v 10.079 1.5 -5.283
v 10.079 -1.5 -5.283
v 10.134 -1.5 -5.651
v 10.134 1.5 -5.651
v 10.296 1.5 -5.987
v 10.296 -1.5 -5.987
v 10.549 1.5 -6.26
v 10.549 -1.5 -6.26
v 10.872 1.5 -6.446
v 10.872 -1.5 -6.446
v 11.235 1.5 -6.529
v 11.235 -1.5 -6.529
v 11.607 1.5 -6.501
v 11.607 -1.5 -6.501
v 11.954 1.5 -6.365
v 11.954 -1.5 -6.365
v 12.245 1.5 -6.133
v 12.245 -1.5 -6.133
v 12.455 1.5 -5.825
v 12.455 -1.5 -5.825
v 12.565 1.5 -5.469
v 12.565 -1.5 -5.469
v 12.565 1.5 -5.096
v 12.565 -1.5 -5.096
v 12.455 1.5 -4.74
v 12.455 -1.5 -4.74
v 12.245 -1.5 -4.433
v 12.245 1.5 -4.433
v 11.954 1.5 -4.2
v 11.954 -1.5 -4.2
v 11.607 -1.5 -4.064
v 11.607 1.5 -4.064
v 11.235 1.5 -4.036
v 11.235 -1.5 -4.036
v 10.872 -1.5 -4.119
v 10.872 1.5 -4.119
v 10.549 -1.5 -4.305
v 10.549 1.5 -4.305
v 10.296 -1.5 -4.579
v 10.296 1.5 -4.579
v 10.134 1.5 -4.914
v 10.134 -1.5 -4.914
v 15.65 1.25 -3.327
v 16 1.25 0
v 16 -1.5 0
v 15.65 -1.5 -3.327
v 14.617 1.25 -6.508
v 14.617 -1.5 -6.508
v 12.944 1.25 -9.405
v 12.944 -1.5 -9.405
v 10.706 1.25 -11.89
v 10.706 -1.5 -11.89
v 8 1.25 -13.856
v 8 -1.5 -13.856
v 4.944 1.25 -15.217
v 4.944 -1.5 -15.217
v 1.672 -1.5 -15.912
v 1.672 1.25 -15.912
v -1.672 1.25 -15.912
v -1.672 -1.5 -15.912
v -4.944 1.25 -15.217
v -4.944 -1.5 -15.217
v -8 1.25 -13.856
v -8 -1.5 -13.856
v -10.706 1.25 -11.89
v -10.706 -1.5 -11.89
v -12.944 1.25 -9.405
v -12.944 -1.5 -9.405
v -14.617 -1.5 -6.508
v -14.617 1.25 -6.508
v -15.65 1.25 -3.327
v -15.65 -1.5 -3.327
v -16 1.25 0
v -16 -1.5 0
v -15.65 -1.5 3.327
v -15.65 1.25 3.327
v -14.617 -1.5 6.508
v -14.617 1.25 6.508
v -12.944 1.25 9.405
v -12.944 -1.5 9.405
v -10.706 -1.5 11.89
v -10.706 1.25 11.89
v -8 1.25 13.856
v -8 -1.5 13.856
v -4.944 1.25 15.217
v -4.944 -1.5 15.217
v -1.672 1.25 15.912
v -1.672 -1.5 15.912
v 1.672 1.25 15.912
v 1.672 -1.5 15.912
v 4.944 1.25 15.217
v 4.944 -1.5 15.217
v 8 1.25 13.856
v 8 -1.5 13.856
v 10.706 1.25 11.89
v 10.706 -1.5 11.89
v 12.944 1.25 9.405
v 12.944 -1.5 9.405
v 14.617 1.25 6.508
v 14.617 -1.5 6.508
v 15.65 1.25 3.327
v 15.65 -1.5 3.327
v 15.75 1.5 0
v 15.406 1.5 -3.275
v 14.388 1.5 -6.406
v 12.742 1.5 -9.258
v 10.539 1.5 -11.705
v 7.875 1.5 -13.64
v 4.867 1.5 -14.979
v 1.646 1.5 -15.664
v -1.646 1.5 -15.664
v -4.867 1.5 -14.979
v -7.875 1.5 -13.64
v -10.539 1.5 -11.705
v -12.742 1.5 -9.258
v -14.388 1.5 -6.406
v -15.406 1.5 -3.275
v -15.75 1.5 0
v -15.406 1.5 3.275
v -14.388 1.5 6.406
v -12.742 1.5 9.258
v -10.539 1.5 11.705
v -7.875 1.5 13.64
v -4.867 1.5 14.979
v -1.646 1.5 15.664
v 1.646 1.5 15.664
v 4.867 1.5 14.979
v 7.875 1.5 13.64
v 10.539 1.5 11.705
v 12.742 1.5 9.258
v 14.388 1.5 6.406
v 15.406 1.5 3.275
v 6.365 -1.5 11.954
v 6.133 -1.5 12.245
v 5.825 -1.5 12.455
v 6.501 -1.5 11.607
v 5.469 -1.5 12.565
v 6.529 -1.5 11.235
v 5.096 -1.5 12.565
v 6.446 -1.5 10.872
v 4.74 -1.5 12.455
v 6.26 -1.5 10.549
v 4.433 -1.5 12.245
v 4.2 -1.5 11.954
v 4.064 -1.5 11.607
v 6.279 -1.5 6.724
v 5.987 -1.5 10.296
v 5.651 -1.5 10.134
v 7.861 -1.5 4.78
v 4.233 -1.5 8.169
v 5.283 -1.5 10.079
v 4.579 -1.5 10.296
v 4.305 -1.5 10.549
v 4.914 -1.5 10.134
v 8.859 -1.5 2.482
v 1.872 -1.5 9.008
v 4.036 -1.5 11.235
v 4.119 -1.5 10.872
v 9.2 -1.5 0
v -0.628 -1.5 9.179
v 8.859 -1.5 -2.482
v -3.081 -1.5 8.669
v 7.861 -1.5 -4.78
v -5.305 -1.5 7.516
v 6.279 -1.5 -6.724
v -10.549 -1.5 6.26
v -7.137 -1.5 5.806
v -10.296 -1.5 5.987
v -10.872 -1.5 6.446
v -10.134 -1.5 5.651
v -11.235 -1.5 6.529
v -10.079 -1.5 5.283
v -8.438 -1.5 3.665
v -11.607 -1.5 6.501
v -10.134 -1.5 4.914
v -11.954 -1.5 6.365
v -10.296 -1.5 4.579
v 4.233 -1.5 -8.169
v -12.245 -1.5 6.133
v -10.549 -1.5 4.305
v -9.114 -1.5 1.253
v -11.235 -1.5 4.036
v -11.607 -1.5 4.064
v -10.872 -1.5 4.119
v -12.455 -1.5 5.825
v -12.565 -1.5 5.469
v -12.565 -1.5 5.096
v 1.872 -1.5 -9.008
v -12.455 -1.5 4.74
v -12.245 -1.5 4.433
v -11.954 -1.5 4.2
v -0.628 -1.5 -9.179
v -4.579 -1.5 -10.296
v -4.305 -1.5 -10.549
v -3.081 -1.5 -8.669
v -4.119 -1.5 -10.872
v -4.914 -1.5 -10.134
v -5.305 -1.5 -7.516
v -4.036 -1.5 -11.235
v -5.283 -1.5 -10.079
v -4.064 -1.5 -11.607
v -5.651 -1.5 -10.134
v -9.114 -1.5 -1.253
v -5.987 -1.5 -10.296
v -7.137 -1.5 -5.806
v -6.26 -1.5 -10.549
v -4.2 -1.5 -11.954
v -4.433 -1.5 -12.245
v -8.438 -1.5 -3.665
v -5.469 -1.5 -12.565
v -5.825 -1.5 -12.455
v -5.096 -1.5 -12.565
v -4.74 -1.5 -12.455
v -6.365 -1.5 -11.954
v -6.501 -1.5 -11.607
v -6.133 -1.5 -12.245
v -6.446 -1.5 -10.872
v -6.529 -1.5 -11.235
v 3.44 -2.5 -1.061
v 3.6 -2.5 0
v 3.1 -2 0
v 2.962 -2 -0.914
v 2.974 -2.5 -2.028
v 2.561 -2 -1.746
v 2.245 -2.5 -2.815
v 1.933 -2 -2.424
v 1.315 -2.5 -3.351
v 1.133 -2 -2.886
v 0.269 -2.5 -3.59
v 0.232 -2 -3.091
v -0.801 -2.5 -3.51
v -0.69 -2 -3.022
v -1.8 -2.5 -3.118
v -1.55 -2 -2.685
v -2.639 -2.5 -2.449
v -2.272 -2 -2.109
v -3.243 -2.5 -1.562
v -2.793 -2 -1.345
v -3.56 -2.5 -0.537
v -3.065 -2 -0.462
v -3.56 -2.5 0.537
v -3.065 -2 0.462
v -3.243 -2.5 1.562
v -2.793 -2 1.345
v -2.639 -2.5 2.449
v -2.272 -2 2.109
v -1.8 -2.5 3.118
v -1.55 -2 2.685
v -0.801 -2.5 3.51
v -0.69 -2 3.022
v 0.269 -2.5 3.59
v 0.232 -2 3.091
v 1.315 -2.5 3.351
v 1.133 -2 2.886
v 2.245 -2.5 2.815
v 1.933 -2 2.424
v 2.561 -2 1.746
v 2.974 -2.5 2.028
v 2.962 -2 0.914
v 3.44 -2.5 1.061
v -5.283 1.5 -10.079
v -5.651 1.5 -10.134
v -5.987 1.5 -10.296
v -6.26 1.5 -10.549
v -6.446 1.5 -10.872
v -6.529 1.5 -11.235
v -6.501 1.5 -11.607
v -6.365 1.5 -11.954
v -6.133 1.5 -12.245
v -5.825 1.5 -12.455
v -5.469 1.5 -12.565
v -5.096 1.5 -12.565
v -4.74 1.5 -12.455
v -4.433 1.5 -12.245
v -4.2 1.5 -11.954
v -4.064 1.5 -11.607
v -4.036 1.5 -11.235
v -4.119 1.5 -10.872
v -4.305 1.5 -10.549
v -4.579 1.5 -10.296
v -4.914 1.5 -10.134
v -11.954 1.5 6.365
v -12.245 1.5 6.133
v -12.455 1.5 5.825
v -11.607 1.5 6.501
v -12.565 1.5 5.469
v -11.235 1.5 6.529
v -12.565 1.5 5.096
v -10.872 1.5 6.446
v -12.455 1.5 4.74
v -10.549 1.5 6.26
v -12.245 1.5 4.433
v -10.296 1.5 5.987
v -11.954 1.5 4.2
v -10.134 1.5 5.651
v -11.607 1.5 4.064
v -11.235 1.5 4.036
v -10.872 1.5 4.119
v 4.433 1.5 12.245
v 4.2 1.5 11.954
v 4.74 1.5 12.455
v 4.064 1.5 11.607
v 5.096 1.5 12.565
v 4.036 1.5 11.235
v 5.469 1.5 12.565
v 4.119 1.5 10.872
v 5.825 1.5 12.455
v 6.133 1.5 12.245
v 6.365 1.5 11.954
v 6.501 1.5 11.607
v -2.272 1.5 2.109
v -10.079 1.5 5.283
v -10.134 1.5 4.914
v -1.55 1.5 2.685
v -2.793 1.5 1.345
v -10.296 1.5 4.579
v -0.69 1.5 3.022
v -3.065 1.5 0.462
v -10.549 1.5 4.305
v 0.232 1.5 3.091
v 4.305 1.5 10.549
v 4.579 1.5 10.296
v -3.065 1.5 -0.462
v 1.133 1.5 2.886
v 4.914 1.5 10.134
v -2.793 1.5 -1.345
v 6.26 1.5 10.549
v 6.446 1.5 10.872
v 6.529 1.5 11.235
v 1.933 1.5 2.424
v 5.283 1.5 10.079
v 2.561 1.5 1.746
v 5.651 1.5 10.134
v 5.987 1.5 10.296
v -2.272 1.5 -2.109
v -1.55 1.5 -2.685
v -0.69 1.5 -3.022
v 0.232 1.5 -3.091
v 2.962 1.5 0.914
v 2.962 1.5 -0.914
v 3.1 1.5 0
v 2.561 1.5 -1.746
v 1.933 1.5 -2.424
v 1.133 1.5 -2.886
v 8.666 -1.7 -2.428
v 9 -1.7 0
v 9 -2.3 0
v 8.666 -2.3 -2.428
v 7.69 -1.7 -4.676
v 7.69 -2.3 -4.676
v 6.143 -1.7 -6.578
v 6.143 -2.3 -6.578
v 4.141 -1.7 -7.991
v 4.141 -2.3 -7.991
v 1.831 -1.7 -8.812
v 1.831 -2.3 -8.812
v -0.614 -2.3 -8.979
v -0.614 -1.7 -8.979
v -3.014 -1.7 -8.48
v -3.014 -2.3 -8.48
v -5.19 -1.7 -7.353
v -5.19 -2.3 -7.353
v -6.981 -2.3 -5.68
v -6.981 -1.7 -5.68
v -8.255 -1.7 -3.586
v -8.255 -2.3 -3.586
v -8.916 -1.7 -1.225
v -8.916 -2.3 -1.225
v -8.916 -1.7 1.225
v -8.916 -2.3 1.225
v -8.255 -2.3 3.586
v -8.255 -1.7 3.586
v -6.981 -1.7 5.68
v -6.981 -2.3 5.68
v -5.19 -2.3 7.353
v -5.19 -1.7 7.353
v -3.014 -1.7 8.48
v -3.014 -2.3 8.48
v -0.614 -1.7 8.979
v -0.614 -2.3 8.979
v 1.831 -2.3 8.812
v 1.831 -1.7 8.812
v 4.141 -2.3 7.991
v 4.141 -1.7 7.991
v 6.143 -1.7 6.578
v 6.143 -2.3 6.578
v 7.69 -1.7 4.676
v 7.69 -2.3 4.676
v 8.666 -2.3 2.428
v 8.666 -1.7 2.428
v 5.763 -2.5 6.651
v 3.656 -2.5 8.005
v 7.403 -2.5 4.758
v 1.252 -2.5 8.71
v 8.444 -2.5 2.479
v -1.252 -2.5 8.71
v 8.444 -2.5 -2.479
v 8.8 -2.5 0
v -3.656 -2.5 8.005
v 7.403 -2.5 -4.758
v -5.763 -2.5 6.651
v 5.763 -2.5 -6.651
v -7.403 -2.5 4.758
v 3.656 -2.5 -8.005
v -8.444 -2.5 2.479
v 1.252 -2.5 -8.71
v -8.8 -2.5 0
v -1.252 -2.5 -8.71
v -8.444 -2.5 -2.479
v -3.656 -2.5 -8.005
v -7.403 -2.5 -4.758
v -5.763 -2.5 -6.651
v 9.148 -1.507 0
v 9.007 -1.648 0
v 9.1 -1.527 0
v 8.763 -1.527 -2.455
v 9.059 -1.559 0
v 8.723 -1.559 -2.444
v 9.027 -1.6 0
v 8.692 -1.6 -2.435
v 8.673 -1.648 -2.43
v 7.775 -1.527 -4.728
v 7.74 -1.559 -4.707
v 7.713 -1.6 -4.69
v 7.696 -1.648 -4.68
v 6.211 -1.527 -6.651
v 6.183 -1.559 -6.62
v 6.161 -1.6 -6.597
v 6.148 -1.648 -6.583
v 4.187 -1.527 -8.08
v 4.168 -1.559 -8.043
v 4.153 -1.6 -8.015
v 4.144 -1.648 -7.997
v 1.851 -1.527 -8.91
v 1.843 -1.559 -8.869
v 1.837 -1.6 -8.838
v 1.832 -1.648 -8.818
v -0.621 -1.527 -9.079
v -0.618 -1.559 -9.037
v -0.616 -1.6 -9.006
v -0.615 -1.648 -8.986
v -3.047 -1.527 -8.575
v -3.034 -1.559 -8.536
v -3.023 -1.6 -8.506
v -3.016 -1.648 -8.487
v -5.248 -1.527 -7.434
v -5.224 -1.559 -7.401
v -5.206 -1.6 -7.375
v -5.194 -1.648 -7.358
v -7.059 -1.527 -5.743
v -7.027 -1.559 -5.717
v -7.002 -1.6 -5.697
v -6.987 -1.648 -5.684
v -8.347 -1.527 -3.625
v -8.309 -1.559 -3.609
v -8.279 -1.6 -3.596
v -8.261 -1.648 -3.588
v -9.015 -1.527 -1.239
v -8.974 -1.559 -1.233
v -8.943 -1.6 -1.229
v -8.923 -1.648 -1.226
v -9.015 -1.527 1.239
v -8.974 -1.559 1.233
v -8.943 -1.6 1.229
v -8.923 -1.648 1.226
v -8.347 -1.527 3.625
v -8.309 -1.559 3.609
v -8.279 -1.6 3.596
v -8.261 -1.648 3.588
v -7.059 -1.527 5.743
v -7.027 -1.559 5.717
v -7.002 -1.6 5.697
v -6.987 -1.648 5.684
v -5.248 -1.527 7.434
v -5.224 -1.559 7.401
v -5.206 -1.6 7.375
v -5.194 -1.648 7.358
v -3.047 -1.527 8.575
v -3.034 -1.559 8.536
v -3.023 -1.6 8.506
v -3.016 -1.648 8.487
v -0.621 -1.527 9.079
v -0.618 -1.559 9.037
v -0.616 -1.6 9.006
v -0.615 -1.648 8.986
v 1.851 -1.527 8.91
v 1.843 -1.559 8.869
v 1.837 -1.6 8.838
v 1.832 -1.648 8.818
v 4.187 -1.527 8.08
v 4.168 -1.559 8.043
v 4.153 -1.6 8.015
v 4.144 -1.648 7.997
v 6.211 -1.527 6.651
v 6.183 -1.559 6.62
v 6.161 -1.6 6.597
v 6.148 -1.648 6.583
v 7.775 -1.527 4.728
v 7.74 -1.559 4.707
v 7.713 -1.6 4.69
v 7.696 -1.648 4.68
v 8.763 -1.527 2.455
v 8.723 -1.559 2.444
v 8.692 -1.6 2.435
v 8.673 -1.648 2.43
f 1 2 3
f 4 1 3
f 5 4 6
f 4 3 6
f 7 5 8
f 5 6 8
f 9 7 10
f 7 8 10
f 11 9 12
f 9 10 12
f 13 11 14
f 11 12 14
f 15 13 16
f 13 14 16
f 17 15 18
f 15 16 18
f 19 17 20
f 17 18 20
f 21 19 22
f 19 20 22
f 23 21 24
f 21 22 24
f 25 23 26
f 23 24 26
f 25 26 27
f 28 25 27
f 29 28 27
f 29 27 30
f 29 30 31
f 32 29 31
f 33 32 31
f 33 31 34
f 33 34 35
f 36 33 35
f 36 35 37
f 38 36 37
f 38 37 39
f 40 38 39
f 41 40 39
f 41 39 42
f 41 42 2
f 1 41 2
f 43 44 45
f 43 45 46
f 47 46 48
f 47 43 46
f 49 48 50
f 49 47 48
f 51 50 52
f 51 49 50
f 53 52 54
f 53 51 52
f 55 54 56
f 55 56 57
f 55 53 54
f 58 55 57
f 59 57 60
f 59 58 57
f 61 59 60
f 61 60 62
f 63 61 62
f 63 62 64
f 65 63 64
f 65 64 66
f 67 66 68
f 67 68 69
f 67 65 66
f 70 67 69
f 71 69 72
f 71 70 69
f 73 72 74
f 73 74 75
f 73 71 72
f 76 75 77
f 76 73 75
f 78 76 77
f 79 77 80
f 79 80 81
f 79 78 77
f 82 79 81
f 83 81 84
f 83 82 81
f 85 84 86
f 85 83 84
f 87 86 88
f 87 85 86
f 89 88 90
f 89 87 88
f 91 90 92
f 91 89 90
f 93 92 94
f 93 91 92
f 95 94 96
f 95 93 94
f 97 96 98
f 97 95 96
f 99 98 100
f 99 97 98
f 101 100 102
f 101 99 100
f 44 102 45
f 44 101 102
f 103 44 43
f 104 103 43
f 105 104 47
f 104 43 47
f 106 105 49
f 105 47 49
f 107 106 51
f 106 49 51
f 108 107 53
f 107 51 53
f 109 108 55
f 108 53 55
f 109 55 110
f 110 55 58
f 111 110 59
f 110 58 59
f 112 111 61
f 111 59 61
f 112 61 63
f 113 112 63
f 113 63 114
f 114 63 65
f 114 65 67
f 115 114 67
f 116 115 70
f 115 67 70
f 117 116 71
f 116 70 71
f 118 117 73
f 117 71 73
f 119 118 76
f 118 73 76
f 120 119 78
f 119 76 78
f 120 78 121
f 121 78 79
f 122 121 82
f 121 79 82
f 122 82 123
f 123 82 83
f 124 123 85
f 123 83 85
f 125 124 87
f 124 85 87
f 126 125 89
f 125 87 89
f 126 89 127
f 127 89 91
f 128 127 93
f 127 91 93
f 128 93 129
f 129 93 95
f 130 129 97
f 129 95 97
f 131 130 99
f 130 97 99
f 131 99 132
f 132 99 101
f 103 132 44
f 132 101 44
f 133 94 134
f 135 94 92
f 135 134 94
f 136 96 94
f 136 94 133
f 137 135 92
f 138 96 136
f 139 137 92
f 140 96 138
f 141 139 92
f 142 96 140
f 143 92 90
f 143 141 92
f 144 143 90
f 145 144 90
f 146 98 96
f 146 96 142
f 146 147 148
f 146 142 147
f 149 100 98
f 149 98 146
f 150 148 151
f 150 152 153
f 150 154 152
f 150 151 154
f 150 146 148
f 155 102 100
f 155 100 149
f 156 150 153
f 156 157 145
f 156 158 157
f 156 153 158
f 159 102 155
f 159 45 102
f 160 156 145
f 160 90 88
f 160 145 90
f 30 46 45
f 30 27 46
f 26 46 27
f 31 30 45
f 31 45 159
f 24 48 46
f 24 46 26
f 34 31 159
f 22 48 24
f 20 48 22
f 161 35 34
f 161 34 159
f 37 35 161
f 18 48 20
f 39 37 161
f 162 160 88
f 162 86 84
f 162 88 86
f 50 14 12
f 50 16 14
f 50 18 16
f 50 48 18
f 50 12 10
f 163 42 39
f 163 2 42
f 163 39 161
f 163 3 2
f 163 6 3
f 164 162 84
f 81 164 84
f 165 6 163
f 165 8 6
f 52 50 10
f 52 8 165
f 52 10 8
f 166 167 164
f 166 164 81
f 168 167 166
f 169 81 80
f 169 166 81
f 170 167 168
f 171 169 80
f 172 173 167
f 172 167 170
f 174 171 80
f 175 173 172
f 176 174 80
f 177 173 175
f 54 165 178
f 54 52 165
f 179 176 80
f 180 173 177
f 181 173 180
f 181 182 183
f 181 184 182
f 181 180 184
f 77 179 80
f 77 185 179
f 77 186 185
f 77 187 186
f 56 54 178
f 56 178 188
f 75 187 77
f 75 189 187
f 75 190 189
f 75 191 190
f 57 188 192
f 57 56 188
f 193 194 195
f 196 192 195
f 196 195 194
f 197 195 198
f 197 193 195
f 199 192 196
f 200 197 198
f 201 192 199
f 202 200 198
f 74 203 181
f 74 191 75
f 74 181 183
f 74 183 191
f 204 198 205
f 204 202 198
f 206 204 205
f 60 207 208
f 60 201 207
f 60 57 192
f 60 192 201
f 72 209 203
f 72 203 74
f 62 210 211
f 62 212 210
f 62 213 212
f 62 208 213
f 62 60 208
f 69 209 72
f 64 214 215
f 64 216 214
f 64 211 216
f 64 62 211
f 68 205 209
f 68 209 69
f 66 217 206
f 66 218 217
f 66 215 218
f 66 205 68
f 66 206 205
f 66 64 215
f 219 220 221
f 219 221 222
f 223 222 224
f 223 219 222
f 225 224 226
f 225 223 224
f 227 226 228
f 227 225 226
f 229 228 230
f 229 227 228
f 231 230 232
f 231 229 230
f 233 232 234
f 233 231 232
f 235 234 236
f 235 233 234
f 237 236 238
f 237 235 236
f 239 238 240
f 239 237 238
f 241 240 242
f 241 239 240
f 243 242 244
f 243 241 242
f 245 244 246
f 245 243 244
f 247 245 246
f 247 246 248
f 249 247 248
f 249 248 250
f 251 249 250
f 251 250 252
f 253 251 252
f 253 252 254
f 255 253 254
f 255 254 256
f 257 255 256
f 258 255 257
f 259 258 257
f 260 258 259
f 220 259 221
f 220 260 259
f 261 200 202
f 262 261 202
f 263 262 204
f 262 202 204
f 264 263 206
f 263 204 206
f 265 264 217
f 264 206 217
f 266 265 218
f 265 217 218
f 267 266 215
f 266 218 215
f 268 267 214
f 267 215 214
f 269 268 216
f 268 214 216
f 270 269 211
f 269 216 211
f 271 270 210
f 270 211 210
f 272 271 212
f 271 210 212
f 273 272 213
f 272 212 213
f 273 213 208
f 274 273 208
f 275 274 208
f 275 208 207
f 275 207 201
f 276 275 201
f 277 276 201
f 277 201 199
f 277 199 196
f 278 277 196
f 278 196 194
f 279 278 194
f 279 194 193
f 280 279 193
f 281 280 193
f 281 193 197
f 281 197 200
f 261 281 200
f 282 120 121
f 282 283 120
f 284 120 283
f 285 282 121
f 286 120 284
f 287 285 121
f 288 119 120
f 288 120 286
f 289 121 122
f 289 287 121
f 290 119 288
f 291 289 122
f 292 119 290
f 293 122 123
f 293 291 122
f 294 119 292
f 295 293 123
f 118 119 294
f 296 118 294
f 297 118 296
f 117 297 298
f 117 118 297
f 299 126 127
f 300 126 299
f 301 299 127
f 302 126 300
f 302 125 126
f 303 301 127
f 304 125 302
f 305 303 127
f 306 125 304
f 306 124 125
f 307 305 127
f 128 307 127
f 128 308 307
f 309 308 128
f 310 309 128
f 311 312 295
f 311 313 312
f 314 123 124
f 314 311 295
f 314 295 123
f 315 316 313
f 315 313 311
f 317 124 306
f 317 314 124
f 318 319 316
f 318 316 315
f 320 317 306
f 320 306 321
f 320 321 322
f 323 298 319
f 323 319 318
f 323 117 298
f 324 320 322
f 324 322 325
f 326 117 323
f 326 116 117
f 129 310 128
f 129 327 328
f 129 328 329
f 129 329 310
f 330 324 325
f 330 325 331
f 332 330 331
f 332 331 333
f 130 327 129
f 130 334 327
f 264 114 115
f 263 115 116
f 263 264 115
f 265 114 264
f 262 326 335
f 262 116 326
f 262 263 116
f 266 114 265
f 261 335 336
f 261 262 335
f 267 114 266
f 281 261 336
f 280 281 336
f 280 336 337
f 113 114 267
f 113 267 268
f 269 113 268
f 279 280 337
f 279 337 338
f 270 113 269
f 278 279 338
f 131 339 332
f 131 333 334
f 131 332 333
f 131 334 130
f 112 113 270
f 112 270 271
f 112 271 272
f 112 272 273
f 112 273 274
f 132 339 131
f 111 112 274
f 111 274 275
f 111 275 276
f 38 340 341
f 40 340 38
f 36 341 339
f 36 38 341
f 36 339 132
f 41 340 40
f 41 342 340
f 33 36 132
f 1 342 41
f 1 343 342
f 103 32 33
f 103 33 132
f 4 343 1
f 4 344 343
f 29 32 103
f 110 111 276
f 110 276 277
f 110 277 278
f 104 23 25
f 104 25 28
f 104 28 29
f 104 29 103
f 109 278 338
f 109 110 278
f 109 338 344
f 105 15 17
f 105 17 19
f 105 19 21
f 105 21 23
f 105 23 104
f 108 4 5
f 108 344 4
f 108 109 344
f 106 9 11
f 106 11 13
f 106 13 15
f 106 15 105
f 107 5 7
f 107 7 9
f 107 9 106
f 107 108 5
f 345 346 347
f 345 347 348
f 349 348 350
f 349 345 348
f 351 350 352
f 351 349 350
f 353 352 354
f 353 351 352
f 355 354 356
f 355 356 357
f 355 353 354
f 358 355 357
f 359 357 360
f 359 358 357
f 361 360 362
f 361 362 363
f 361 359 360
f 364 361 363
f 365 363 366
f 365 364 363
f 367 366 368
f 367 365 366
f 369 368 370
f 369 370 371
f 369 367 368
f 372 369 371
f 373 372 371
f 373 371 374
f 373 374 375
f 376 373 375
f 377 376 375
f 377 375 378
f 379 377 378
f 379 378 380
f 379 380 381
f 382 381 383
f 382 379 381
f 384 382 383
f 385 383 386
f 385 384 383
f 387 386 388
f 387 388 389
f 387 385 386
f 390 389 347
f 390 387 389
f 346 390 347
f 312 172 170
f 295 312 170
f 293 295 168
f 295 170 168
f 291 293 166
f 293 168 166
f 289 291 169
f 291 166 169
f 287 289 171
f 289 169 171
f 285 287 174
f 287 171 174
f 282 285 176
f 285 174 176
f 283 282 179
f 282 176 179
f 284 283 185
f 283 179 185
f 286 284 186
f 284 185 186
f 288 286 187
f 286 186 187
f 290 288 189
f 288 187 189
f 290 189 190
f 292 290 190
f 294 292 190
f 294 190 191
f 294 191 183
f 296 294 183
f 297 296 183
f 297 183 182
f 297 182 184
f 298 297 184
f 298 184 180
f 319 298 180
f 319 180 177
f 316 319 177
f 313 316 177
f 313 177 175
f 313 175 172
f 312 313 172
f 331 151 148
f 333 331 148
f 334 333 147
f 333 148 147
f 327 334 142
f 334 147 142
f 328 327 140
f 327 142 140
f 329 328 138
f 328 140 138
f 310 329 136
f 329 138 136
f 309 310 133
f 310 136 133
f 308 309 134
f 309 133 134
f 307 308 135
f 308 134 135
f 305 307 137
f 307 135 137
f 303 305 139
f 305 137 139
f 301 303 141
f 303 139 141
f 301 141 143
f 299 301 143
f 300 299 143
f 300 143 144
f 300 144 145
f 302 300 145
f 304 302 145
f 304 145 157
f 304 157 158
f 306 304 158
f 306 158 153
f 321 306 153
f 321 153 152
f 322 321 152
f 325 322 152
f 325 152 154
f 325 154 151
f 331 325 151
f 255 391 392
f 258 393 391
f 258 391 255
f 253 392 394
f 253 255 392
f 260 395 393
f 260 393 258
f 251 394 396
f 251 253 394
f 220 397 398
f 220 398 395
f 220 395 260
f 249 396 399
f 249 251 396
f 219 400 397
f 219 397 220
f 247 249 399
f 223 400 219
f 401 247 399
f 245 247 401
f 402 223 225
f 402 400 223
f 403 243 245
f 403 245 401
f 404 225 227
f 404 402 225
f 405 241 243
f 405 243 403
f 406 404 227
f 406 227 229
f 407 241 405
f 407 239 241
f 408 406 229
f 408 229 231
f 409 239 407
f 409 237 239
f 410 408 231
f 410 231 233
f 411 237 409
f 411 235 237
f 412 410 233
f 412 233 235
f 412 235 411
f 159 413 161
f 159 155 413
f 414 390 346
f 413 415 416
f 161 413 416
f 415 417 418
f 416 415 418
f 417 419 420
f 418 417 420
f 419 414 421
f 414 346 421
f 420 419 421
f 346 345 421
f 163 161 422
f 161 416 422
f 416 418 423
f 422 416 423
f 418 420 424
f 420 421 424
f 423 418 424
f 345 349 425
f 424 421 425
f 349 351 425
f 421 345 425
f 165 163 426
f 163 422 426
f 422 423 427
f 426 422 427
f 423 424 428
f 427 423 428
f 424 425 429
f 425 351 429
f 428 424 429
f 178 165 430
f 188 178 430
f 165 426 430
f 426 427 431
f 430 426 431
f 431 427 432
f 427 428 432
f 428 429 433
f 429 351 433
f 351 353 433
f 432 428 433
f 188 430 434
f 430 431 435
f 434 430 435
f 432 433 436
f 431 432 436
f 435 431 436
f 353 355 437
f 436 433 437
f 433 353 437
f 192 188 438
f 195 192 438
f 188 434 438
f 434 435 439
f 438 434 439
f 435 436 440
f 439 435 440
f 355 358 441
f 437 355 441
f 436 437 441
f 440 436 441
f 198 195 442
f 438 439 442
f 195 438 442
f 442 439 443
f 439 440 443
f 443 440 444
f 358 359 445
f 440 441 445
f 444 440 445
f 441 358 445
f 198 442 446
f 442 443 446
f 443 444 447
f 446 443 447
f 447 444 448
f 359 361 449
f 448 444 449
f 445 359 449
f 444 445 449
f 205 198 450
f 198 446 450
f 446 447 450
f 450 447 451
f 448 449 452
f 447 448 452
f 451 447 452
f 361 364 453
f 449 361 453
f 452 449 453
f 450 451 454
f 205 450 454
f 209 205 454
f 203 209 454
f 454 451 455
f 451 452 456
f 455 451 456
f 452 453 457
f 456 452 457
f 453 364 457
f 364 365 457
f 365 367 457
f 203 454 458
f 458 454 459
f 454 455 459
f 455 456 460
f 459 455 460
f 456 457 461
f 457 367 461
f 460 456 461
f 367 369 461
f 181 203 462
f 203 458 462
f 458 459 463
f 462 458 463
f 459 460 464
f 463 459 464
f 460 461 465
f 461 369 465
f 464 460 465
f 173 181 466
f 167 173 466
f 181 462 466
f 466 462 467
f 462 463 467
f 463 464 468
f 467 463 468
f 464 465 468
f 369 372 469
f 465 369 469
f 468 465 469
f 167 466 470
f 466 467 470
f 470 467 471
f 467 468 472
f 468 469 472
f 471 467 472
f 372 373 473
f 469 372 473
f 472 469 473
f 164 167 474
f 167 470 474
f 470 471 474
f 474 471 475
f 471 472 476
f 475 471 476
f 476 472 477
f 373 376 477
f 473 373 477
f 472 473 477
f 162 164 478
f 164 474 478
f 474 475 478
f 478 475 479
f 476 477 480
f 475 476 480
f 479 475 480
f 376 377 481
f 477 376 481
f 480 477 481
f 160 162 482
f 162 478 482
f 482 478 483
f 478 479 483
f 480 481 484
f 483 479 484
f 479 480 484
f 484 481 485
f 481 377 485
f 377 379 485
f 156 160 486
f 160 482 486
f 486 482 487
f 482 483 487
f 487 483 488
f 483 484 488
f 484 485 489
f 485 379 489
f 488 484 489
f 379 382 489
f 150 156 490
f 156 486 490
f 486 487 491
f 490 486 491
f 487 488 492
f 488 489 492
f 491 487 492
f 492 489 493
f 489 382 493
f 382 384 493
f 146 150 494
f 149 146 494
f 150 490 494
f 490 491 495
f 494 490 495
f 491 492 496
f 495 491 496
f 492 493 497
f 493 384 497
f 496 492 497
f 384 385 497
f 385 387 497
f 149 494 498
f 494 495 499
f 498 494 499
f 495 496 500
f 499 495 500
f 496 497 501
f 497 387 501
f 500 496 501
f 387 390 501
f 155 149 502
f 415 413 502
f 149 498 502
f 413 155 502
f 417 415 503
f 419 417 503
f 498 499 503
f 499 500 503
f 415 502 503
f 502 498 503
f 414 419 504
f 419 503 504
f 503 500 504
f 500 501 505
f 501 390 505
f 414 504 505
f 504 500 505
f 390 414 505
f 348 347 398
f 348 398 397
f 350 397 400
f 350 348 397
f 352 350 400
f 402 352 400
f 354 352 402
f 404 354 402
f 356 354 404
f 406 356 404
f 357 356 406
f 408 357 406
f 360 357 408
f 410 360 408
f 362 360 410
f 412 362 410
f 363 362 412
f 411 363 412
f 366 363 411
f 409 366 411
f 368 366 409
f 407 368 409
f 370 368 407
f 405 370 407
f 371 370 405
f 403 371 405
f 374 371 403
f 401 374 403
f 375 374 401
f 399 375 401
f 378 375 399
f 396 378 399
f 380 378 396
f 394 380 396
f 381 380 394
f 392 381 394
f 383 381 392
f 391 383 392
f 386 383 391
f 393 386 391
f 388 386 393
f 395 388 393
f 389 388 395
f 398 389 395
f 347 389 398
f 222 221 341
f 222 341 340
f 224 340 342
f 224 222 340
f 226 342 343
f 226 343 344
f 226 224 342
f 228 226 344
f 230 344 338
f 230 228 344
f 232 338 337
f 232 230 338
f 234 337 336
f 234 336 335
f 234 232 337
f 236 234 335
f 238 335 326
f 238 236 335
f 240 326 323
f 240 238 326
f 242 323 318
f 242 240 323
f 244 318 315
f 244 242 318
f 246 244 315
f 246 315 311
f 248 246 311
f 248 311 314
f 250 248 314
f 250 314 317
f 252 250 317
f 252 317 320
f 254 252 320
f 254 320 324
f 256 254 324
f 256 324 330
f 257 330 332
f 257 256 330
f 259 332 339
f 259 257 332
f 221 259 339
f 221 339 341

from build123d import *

# Parameters (mm, degrees)
CHANFRO1_SIZE                 = 0.5
FURO_ROSCADO_DE_M3X0_52_D     = 2.5
FURO_ROSCADO_DE_M3X0_52_DEPTH = 3.001
PADR_OCIRCULAR2_COUNT         = 4
CHANFRO2_SIZE                 = 0.2
CHANFRO3_SIZE                 = 0.25
FILETE3_R                     = 0.2


with BuildPart() as part:
    # Esboço1 → Revolução1 (revolve)
    with BuildSketch(Plane.XY):
        Polygon((3.1, 1.5), (3.1, -2.5), (9, -2.5), (9, -1.5), (16, -1.5), (16, 1.5), align=None)
    revolve(axis=Axis((0, 0, 0), (0, 1, 0)))

    # Chanfro1
    chanfro1_edges = [part.edges().sort_by_distance(p)[0] for p in [
        (-3.1, -2.5, 0),
    ]]
    chamfer(chanfro1_edges, length=CHANFRO1_SIZE)

    # Furo roscado de M3x0.52
    with Locations(Plane(origin=(0, 1.5, 0), x_dir=(1, 0, 0), z_dir=(0, 1, 0))):
        with Locations((11.328847338, 5.282728272)):
            furo_roscado_de_m3x0_52 = Hole(FURO_ROSCADO_DE_M3X0_52_D / 2, depth=FURO_ROSCADO_DE_M3X0_52_DEPTH)

    # PadrãoCircular2: Furo roscado de M3x0.52 ×4 about axis
    padr_ocircular2_axis = Axis((0, 0, 0), (0, 1, 0))
    for i in range(1, PADR_OCIRCULAR2_COUNT):
        add(furo_roscado_de_m3x0_52.rotate(padr_ocircular2_axis, i * 360 / PADR_OCIRCULAR2_COUNT), mode=Mode.SUBTRACT)

    # Chanfro2
    chanfro2_edges = [part.edges().sort_by_distance(p)[0] for p in [
        (-9, -2.5, 0),
    ]]
    chamfer(chanfro2_edges, length=CHANFRO2_SIZE)

    # Chanfro3
    chanfro3_edges = [part.edges().sort_by_distance(p)[0] for p in [
        (-16, 1.5, 0),
    ]]
    chamfer(chanfro3_edges, length=CHANFRO3_SIZE)

    # Filete3
    filete3_edges = [part.edges().sort_by_distance(p)[0] for p in [
        (-9, -1.5, 0),
    ]]
    fillet(filete3_edges, radius=FILETE3_R)


solid = part.part
